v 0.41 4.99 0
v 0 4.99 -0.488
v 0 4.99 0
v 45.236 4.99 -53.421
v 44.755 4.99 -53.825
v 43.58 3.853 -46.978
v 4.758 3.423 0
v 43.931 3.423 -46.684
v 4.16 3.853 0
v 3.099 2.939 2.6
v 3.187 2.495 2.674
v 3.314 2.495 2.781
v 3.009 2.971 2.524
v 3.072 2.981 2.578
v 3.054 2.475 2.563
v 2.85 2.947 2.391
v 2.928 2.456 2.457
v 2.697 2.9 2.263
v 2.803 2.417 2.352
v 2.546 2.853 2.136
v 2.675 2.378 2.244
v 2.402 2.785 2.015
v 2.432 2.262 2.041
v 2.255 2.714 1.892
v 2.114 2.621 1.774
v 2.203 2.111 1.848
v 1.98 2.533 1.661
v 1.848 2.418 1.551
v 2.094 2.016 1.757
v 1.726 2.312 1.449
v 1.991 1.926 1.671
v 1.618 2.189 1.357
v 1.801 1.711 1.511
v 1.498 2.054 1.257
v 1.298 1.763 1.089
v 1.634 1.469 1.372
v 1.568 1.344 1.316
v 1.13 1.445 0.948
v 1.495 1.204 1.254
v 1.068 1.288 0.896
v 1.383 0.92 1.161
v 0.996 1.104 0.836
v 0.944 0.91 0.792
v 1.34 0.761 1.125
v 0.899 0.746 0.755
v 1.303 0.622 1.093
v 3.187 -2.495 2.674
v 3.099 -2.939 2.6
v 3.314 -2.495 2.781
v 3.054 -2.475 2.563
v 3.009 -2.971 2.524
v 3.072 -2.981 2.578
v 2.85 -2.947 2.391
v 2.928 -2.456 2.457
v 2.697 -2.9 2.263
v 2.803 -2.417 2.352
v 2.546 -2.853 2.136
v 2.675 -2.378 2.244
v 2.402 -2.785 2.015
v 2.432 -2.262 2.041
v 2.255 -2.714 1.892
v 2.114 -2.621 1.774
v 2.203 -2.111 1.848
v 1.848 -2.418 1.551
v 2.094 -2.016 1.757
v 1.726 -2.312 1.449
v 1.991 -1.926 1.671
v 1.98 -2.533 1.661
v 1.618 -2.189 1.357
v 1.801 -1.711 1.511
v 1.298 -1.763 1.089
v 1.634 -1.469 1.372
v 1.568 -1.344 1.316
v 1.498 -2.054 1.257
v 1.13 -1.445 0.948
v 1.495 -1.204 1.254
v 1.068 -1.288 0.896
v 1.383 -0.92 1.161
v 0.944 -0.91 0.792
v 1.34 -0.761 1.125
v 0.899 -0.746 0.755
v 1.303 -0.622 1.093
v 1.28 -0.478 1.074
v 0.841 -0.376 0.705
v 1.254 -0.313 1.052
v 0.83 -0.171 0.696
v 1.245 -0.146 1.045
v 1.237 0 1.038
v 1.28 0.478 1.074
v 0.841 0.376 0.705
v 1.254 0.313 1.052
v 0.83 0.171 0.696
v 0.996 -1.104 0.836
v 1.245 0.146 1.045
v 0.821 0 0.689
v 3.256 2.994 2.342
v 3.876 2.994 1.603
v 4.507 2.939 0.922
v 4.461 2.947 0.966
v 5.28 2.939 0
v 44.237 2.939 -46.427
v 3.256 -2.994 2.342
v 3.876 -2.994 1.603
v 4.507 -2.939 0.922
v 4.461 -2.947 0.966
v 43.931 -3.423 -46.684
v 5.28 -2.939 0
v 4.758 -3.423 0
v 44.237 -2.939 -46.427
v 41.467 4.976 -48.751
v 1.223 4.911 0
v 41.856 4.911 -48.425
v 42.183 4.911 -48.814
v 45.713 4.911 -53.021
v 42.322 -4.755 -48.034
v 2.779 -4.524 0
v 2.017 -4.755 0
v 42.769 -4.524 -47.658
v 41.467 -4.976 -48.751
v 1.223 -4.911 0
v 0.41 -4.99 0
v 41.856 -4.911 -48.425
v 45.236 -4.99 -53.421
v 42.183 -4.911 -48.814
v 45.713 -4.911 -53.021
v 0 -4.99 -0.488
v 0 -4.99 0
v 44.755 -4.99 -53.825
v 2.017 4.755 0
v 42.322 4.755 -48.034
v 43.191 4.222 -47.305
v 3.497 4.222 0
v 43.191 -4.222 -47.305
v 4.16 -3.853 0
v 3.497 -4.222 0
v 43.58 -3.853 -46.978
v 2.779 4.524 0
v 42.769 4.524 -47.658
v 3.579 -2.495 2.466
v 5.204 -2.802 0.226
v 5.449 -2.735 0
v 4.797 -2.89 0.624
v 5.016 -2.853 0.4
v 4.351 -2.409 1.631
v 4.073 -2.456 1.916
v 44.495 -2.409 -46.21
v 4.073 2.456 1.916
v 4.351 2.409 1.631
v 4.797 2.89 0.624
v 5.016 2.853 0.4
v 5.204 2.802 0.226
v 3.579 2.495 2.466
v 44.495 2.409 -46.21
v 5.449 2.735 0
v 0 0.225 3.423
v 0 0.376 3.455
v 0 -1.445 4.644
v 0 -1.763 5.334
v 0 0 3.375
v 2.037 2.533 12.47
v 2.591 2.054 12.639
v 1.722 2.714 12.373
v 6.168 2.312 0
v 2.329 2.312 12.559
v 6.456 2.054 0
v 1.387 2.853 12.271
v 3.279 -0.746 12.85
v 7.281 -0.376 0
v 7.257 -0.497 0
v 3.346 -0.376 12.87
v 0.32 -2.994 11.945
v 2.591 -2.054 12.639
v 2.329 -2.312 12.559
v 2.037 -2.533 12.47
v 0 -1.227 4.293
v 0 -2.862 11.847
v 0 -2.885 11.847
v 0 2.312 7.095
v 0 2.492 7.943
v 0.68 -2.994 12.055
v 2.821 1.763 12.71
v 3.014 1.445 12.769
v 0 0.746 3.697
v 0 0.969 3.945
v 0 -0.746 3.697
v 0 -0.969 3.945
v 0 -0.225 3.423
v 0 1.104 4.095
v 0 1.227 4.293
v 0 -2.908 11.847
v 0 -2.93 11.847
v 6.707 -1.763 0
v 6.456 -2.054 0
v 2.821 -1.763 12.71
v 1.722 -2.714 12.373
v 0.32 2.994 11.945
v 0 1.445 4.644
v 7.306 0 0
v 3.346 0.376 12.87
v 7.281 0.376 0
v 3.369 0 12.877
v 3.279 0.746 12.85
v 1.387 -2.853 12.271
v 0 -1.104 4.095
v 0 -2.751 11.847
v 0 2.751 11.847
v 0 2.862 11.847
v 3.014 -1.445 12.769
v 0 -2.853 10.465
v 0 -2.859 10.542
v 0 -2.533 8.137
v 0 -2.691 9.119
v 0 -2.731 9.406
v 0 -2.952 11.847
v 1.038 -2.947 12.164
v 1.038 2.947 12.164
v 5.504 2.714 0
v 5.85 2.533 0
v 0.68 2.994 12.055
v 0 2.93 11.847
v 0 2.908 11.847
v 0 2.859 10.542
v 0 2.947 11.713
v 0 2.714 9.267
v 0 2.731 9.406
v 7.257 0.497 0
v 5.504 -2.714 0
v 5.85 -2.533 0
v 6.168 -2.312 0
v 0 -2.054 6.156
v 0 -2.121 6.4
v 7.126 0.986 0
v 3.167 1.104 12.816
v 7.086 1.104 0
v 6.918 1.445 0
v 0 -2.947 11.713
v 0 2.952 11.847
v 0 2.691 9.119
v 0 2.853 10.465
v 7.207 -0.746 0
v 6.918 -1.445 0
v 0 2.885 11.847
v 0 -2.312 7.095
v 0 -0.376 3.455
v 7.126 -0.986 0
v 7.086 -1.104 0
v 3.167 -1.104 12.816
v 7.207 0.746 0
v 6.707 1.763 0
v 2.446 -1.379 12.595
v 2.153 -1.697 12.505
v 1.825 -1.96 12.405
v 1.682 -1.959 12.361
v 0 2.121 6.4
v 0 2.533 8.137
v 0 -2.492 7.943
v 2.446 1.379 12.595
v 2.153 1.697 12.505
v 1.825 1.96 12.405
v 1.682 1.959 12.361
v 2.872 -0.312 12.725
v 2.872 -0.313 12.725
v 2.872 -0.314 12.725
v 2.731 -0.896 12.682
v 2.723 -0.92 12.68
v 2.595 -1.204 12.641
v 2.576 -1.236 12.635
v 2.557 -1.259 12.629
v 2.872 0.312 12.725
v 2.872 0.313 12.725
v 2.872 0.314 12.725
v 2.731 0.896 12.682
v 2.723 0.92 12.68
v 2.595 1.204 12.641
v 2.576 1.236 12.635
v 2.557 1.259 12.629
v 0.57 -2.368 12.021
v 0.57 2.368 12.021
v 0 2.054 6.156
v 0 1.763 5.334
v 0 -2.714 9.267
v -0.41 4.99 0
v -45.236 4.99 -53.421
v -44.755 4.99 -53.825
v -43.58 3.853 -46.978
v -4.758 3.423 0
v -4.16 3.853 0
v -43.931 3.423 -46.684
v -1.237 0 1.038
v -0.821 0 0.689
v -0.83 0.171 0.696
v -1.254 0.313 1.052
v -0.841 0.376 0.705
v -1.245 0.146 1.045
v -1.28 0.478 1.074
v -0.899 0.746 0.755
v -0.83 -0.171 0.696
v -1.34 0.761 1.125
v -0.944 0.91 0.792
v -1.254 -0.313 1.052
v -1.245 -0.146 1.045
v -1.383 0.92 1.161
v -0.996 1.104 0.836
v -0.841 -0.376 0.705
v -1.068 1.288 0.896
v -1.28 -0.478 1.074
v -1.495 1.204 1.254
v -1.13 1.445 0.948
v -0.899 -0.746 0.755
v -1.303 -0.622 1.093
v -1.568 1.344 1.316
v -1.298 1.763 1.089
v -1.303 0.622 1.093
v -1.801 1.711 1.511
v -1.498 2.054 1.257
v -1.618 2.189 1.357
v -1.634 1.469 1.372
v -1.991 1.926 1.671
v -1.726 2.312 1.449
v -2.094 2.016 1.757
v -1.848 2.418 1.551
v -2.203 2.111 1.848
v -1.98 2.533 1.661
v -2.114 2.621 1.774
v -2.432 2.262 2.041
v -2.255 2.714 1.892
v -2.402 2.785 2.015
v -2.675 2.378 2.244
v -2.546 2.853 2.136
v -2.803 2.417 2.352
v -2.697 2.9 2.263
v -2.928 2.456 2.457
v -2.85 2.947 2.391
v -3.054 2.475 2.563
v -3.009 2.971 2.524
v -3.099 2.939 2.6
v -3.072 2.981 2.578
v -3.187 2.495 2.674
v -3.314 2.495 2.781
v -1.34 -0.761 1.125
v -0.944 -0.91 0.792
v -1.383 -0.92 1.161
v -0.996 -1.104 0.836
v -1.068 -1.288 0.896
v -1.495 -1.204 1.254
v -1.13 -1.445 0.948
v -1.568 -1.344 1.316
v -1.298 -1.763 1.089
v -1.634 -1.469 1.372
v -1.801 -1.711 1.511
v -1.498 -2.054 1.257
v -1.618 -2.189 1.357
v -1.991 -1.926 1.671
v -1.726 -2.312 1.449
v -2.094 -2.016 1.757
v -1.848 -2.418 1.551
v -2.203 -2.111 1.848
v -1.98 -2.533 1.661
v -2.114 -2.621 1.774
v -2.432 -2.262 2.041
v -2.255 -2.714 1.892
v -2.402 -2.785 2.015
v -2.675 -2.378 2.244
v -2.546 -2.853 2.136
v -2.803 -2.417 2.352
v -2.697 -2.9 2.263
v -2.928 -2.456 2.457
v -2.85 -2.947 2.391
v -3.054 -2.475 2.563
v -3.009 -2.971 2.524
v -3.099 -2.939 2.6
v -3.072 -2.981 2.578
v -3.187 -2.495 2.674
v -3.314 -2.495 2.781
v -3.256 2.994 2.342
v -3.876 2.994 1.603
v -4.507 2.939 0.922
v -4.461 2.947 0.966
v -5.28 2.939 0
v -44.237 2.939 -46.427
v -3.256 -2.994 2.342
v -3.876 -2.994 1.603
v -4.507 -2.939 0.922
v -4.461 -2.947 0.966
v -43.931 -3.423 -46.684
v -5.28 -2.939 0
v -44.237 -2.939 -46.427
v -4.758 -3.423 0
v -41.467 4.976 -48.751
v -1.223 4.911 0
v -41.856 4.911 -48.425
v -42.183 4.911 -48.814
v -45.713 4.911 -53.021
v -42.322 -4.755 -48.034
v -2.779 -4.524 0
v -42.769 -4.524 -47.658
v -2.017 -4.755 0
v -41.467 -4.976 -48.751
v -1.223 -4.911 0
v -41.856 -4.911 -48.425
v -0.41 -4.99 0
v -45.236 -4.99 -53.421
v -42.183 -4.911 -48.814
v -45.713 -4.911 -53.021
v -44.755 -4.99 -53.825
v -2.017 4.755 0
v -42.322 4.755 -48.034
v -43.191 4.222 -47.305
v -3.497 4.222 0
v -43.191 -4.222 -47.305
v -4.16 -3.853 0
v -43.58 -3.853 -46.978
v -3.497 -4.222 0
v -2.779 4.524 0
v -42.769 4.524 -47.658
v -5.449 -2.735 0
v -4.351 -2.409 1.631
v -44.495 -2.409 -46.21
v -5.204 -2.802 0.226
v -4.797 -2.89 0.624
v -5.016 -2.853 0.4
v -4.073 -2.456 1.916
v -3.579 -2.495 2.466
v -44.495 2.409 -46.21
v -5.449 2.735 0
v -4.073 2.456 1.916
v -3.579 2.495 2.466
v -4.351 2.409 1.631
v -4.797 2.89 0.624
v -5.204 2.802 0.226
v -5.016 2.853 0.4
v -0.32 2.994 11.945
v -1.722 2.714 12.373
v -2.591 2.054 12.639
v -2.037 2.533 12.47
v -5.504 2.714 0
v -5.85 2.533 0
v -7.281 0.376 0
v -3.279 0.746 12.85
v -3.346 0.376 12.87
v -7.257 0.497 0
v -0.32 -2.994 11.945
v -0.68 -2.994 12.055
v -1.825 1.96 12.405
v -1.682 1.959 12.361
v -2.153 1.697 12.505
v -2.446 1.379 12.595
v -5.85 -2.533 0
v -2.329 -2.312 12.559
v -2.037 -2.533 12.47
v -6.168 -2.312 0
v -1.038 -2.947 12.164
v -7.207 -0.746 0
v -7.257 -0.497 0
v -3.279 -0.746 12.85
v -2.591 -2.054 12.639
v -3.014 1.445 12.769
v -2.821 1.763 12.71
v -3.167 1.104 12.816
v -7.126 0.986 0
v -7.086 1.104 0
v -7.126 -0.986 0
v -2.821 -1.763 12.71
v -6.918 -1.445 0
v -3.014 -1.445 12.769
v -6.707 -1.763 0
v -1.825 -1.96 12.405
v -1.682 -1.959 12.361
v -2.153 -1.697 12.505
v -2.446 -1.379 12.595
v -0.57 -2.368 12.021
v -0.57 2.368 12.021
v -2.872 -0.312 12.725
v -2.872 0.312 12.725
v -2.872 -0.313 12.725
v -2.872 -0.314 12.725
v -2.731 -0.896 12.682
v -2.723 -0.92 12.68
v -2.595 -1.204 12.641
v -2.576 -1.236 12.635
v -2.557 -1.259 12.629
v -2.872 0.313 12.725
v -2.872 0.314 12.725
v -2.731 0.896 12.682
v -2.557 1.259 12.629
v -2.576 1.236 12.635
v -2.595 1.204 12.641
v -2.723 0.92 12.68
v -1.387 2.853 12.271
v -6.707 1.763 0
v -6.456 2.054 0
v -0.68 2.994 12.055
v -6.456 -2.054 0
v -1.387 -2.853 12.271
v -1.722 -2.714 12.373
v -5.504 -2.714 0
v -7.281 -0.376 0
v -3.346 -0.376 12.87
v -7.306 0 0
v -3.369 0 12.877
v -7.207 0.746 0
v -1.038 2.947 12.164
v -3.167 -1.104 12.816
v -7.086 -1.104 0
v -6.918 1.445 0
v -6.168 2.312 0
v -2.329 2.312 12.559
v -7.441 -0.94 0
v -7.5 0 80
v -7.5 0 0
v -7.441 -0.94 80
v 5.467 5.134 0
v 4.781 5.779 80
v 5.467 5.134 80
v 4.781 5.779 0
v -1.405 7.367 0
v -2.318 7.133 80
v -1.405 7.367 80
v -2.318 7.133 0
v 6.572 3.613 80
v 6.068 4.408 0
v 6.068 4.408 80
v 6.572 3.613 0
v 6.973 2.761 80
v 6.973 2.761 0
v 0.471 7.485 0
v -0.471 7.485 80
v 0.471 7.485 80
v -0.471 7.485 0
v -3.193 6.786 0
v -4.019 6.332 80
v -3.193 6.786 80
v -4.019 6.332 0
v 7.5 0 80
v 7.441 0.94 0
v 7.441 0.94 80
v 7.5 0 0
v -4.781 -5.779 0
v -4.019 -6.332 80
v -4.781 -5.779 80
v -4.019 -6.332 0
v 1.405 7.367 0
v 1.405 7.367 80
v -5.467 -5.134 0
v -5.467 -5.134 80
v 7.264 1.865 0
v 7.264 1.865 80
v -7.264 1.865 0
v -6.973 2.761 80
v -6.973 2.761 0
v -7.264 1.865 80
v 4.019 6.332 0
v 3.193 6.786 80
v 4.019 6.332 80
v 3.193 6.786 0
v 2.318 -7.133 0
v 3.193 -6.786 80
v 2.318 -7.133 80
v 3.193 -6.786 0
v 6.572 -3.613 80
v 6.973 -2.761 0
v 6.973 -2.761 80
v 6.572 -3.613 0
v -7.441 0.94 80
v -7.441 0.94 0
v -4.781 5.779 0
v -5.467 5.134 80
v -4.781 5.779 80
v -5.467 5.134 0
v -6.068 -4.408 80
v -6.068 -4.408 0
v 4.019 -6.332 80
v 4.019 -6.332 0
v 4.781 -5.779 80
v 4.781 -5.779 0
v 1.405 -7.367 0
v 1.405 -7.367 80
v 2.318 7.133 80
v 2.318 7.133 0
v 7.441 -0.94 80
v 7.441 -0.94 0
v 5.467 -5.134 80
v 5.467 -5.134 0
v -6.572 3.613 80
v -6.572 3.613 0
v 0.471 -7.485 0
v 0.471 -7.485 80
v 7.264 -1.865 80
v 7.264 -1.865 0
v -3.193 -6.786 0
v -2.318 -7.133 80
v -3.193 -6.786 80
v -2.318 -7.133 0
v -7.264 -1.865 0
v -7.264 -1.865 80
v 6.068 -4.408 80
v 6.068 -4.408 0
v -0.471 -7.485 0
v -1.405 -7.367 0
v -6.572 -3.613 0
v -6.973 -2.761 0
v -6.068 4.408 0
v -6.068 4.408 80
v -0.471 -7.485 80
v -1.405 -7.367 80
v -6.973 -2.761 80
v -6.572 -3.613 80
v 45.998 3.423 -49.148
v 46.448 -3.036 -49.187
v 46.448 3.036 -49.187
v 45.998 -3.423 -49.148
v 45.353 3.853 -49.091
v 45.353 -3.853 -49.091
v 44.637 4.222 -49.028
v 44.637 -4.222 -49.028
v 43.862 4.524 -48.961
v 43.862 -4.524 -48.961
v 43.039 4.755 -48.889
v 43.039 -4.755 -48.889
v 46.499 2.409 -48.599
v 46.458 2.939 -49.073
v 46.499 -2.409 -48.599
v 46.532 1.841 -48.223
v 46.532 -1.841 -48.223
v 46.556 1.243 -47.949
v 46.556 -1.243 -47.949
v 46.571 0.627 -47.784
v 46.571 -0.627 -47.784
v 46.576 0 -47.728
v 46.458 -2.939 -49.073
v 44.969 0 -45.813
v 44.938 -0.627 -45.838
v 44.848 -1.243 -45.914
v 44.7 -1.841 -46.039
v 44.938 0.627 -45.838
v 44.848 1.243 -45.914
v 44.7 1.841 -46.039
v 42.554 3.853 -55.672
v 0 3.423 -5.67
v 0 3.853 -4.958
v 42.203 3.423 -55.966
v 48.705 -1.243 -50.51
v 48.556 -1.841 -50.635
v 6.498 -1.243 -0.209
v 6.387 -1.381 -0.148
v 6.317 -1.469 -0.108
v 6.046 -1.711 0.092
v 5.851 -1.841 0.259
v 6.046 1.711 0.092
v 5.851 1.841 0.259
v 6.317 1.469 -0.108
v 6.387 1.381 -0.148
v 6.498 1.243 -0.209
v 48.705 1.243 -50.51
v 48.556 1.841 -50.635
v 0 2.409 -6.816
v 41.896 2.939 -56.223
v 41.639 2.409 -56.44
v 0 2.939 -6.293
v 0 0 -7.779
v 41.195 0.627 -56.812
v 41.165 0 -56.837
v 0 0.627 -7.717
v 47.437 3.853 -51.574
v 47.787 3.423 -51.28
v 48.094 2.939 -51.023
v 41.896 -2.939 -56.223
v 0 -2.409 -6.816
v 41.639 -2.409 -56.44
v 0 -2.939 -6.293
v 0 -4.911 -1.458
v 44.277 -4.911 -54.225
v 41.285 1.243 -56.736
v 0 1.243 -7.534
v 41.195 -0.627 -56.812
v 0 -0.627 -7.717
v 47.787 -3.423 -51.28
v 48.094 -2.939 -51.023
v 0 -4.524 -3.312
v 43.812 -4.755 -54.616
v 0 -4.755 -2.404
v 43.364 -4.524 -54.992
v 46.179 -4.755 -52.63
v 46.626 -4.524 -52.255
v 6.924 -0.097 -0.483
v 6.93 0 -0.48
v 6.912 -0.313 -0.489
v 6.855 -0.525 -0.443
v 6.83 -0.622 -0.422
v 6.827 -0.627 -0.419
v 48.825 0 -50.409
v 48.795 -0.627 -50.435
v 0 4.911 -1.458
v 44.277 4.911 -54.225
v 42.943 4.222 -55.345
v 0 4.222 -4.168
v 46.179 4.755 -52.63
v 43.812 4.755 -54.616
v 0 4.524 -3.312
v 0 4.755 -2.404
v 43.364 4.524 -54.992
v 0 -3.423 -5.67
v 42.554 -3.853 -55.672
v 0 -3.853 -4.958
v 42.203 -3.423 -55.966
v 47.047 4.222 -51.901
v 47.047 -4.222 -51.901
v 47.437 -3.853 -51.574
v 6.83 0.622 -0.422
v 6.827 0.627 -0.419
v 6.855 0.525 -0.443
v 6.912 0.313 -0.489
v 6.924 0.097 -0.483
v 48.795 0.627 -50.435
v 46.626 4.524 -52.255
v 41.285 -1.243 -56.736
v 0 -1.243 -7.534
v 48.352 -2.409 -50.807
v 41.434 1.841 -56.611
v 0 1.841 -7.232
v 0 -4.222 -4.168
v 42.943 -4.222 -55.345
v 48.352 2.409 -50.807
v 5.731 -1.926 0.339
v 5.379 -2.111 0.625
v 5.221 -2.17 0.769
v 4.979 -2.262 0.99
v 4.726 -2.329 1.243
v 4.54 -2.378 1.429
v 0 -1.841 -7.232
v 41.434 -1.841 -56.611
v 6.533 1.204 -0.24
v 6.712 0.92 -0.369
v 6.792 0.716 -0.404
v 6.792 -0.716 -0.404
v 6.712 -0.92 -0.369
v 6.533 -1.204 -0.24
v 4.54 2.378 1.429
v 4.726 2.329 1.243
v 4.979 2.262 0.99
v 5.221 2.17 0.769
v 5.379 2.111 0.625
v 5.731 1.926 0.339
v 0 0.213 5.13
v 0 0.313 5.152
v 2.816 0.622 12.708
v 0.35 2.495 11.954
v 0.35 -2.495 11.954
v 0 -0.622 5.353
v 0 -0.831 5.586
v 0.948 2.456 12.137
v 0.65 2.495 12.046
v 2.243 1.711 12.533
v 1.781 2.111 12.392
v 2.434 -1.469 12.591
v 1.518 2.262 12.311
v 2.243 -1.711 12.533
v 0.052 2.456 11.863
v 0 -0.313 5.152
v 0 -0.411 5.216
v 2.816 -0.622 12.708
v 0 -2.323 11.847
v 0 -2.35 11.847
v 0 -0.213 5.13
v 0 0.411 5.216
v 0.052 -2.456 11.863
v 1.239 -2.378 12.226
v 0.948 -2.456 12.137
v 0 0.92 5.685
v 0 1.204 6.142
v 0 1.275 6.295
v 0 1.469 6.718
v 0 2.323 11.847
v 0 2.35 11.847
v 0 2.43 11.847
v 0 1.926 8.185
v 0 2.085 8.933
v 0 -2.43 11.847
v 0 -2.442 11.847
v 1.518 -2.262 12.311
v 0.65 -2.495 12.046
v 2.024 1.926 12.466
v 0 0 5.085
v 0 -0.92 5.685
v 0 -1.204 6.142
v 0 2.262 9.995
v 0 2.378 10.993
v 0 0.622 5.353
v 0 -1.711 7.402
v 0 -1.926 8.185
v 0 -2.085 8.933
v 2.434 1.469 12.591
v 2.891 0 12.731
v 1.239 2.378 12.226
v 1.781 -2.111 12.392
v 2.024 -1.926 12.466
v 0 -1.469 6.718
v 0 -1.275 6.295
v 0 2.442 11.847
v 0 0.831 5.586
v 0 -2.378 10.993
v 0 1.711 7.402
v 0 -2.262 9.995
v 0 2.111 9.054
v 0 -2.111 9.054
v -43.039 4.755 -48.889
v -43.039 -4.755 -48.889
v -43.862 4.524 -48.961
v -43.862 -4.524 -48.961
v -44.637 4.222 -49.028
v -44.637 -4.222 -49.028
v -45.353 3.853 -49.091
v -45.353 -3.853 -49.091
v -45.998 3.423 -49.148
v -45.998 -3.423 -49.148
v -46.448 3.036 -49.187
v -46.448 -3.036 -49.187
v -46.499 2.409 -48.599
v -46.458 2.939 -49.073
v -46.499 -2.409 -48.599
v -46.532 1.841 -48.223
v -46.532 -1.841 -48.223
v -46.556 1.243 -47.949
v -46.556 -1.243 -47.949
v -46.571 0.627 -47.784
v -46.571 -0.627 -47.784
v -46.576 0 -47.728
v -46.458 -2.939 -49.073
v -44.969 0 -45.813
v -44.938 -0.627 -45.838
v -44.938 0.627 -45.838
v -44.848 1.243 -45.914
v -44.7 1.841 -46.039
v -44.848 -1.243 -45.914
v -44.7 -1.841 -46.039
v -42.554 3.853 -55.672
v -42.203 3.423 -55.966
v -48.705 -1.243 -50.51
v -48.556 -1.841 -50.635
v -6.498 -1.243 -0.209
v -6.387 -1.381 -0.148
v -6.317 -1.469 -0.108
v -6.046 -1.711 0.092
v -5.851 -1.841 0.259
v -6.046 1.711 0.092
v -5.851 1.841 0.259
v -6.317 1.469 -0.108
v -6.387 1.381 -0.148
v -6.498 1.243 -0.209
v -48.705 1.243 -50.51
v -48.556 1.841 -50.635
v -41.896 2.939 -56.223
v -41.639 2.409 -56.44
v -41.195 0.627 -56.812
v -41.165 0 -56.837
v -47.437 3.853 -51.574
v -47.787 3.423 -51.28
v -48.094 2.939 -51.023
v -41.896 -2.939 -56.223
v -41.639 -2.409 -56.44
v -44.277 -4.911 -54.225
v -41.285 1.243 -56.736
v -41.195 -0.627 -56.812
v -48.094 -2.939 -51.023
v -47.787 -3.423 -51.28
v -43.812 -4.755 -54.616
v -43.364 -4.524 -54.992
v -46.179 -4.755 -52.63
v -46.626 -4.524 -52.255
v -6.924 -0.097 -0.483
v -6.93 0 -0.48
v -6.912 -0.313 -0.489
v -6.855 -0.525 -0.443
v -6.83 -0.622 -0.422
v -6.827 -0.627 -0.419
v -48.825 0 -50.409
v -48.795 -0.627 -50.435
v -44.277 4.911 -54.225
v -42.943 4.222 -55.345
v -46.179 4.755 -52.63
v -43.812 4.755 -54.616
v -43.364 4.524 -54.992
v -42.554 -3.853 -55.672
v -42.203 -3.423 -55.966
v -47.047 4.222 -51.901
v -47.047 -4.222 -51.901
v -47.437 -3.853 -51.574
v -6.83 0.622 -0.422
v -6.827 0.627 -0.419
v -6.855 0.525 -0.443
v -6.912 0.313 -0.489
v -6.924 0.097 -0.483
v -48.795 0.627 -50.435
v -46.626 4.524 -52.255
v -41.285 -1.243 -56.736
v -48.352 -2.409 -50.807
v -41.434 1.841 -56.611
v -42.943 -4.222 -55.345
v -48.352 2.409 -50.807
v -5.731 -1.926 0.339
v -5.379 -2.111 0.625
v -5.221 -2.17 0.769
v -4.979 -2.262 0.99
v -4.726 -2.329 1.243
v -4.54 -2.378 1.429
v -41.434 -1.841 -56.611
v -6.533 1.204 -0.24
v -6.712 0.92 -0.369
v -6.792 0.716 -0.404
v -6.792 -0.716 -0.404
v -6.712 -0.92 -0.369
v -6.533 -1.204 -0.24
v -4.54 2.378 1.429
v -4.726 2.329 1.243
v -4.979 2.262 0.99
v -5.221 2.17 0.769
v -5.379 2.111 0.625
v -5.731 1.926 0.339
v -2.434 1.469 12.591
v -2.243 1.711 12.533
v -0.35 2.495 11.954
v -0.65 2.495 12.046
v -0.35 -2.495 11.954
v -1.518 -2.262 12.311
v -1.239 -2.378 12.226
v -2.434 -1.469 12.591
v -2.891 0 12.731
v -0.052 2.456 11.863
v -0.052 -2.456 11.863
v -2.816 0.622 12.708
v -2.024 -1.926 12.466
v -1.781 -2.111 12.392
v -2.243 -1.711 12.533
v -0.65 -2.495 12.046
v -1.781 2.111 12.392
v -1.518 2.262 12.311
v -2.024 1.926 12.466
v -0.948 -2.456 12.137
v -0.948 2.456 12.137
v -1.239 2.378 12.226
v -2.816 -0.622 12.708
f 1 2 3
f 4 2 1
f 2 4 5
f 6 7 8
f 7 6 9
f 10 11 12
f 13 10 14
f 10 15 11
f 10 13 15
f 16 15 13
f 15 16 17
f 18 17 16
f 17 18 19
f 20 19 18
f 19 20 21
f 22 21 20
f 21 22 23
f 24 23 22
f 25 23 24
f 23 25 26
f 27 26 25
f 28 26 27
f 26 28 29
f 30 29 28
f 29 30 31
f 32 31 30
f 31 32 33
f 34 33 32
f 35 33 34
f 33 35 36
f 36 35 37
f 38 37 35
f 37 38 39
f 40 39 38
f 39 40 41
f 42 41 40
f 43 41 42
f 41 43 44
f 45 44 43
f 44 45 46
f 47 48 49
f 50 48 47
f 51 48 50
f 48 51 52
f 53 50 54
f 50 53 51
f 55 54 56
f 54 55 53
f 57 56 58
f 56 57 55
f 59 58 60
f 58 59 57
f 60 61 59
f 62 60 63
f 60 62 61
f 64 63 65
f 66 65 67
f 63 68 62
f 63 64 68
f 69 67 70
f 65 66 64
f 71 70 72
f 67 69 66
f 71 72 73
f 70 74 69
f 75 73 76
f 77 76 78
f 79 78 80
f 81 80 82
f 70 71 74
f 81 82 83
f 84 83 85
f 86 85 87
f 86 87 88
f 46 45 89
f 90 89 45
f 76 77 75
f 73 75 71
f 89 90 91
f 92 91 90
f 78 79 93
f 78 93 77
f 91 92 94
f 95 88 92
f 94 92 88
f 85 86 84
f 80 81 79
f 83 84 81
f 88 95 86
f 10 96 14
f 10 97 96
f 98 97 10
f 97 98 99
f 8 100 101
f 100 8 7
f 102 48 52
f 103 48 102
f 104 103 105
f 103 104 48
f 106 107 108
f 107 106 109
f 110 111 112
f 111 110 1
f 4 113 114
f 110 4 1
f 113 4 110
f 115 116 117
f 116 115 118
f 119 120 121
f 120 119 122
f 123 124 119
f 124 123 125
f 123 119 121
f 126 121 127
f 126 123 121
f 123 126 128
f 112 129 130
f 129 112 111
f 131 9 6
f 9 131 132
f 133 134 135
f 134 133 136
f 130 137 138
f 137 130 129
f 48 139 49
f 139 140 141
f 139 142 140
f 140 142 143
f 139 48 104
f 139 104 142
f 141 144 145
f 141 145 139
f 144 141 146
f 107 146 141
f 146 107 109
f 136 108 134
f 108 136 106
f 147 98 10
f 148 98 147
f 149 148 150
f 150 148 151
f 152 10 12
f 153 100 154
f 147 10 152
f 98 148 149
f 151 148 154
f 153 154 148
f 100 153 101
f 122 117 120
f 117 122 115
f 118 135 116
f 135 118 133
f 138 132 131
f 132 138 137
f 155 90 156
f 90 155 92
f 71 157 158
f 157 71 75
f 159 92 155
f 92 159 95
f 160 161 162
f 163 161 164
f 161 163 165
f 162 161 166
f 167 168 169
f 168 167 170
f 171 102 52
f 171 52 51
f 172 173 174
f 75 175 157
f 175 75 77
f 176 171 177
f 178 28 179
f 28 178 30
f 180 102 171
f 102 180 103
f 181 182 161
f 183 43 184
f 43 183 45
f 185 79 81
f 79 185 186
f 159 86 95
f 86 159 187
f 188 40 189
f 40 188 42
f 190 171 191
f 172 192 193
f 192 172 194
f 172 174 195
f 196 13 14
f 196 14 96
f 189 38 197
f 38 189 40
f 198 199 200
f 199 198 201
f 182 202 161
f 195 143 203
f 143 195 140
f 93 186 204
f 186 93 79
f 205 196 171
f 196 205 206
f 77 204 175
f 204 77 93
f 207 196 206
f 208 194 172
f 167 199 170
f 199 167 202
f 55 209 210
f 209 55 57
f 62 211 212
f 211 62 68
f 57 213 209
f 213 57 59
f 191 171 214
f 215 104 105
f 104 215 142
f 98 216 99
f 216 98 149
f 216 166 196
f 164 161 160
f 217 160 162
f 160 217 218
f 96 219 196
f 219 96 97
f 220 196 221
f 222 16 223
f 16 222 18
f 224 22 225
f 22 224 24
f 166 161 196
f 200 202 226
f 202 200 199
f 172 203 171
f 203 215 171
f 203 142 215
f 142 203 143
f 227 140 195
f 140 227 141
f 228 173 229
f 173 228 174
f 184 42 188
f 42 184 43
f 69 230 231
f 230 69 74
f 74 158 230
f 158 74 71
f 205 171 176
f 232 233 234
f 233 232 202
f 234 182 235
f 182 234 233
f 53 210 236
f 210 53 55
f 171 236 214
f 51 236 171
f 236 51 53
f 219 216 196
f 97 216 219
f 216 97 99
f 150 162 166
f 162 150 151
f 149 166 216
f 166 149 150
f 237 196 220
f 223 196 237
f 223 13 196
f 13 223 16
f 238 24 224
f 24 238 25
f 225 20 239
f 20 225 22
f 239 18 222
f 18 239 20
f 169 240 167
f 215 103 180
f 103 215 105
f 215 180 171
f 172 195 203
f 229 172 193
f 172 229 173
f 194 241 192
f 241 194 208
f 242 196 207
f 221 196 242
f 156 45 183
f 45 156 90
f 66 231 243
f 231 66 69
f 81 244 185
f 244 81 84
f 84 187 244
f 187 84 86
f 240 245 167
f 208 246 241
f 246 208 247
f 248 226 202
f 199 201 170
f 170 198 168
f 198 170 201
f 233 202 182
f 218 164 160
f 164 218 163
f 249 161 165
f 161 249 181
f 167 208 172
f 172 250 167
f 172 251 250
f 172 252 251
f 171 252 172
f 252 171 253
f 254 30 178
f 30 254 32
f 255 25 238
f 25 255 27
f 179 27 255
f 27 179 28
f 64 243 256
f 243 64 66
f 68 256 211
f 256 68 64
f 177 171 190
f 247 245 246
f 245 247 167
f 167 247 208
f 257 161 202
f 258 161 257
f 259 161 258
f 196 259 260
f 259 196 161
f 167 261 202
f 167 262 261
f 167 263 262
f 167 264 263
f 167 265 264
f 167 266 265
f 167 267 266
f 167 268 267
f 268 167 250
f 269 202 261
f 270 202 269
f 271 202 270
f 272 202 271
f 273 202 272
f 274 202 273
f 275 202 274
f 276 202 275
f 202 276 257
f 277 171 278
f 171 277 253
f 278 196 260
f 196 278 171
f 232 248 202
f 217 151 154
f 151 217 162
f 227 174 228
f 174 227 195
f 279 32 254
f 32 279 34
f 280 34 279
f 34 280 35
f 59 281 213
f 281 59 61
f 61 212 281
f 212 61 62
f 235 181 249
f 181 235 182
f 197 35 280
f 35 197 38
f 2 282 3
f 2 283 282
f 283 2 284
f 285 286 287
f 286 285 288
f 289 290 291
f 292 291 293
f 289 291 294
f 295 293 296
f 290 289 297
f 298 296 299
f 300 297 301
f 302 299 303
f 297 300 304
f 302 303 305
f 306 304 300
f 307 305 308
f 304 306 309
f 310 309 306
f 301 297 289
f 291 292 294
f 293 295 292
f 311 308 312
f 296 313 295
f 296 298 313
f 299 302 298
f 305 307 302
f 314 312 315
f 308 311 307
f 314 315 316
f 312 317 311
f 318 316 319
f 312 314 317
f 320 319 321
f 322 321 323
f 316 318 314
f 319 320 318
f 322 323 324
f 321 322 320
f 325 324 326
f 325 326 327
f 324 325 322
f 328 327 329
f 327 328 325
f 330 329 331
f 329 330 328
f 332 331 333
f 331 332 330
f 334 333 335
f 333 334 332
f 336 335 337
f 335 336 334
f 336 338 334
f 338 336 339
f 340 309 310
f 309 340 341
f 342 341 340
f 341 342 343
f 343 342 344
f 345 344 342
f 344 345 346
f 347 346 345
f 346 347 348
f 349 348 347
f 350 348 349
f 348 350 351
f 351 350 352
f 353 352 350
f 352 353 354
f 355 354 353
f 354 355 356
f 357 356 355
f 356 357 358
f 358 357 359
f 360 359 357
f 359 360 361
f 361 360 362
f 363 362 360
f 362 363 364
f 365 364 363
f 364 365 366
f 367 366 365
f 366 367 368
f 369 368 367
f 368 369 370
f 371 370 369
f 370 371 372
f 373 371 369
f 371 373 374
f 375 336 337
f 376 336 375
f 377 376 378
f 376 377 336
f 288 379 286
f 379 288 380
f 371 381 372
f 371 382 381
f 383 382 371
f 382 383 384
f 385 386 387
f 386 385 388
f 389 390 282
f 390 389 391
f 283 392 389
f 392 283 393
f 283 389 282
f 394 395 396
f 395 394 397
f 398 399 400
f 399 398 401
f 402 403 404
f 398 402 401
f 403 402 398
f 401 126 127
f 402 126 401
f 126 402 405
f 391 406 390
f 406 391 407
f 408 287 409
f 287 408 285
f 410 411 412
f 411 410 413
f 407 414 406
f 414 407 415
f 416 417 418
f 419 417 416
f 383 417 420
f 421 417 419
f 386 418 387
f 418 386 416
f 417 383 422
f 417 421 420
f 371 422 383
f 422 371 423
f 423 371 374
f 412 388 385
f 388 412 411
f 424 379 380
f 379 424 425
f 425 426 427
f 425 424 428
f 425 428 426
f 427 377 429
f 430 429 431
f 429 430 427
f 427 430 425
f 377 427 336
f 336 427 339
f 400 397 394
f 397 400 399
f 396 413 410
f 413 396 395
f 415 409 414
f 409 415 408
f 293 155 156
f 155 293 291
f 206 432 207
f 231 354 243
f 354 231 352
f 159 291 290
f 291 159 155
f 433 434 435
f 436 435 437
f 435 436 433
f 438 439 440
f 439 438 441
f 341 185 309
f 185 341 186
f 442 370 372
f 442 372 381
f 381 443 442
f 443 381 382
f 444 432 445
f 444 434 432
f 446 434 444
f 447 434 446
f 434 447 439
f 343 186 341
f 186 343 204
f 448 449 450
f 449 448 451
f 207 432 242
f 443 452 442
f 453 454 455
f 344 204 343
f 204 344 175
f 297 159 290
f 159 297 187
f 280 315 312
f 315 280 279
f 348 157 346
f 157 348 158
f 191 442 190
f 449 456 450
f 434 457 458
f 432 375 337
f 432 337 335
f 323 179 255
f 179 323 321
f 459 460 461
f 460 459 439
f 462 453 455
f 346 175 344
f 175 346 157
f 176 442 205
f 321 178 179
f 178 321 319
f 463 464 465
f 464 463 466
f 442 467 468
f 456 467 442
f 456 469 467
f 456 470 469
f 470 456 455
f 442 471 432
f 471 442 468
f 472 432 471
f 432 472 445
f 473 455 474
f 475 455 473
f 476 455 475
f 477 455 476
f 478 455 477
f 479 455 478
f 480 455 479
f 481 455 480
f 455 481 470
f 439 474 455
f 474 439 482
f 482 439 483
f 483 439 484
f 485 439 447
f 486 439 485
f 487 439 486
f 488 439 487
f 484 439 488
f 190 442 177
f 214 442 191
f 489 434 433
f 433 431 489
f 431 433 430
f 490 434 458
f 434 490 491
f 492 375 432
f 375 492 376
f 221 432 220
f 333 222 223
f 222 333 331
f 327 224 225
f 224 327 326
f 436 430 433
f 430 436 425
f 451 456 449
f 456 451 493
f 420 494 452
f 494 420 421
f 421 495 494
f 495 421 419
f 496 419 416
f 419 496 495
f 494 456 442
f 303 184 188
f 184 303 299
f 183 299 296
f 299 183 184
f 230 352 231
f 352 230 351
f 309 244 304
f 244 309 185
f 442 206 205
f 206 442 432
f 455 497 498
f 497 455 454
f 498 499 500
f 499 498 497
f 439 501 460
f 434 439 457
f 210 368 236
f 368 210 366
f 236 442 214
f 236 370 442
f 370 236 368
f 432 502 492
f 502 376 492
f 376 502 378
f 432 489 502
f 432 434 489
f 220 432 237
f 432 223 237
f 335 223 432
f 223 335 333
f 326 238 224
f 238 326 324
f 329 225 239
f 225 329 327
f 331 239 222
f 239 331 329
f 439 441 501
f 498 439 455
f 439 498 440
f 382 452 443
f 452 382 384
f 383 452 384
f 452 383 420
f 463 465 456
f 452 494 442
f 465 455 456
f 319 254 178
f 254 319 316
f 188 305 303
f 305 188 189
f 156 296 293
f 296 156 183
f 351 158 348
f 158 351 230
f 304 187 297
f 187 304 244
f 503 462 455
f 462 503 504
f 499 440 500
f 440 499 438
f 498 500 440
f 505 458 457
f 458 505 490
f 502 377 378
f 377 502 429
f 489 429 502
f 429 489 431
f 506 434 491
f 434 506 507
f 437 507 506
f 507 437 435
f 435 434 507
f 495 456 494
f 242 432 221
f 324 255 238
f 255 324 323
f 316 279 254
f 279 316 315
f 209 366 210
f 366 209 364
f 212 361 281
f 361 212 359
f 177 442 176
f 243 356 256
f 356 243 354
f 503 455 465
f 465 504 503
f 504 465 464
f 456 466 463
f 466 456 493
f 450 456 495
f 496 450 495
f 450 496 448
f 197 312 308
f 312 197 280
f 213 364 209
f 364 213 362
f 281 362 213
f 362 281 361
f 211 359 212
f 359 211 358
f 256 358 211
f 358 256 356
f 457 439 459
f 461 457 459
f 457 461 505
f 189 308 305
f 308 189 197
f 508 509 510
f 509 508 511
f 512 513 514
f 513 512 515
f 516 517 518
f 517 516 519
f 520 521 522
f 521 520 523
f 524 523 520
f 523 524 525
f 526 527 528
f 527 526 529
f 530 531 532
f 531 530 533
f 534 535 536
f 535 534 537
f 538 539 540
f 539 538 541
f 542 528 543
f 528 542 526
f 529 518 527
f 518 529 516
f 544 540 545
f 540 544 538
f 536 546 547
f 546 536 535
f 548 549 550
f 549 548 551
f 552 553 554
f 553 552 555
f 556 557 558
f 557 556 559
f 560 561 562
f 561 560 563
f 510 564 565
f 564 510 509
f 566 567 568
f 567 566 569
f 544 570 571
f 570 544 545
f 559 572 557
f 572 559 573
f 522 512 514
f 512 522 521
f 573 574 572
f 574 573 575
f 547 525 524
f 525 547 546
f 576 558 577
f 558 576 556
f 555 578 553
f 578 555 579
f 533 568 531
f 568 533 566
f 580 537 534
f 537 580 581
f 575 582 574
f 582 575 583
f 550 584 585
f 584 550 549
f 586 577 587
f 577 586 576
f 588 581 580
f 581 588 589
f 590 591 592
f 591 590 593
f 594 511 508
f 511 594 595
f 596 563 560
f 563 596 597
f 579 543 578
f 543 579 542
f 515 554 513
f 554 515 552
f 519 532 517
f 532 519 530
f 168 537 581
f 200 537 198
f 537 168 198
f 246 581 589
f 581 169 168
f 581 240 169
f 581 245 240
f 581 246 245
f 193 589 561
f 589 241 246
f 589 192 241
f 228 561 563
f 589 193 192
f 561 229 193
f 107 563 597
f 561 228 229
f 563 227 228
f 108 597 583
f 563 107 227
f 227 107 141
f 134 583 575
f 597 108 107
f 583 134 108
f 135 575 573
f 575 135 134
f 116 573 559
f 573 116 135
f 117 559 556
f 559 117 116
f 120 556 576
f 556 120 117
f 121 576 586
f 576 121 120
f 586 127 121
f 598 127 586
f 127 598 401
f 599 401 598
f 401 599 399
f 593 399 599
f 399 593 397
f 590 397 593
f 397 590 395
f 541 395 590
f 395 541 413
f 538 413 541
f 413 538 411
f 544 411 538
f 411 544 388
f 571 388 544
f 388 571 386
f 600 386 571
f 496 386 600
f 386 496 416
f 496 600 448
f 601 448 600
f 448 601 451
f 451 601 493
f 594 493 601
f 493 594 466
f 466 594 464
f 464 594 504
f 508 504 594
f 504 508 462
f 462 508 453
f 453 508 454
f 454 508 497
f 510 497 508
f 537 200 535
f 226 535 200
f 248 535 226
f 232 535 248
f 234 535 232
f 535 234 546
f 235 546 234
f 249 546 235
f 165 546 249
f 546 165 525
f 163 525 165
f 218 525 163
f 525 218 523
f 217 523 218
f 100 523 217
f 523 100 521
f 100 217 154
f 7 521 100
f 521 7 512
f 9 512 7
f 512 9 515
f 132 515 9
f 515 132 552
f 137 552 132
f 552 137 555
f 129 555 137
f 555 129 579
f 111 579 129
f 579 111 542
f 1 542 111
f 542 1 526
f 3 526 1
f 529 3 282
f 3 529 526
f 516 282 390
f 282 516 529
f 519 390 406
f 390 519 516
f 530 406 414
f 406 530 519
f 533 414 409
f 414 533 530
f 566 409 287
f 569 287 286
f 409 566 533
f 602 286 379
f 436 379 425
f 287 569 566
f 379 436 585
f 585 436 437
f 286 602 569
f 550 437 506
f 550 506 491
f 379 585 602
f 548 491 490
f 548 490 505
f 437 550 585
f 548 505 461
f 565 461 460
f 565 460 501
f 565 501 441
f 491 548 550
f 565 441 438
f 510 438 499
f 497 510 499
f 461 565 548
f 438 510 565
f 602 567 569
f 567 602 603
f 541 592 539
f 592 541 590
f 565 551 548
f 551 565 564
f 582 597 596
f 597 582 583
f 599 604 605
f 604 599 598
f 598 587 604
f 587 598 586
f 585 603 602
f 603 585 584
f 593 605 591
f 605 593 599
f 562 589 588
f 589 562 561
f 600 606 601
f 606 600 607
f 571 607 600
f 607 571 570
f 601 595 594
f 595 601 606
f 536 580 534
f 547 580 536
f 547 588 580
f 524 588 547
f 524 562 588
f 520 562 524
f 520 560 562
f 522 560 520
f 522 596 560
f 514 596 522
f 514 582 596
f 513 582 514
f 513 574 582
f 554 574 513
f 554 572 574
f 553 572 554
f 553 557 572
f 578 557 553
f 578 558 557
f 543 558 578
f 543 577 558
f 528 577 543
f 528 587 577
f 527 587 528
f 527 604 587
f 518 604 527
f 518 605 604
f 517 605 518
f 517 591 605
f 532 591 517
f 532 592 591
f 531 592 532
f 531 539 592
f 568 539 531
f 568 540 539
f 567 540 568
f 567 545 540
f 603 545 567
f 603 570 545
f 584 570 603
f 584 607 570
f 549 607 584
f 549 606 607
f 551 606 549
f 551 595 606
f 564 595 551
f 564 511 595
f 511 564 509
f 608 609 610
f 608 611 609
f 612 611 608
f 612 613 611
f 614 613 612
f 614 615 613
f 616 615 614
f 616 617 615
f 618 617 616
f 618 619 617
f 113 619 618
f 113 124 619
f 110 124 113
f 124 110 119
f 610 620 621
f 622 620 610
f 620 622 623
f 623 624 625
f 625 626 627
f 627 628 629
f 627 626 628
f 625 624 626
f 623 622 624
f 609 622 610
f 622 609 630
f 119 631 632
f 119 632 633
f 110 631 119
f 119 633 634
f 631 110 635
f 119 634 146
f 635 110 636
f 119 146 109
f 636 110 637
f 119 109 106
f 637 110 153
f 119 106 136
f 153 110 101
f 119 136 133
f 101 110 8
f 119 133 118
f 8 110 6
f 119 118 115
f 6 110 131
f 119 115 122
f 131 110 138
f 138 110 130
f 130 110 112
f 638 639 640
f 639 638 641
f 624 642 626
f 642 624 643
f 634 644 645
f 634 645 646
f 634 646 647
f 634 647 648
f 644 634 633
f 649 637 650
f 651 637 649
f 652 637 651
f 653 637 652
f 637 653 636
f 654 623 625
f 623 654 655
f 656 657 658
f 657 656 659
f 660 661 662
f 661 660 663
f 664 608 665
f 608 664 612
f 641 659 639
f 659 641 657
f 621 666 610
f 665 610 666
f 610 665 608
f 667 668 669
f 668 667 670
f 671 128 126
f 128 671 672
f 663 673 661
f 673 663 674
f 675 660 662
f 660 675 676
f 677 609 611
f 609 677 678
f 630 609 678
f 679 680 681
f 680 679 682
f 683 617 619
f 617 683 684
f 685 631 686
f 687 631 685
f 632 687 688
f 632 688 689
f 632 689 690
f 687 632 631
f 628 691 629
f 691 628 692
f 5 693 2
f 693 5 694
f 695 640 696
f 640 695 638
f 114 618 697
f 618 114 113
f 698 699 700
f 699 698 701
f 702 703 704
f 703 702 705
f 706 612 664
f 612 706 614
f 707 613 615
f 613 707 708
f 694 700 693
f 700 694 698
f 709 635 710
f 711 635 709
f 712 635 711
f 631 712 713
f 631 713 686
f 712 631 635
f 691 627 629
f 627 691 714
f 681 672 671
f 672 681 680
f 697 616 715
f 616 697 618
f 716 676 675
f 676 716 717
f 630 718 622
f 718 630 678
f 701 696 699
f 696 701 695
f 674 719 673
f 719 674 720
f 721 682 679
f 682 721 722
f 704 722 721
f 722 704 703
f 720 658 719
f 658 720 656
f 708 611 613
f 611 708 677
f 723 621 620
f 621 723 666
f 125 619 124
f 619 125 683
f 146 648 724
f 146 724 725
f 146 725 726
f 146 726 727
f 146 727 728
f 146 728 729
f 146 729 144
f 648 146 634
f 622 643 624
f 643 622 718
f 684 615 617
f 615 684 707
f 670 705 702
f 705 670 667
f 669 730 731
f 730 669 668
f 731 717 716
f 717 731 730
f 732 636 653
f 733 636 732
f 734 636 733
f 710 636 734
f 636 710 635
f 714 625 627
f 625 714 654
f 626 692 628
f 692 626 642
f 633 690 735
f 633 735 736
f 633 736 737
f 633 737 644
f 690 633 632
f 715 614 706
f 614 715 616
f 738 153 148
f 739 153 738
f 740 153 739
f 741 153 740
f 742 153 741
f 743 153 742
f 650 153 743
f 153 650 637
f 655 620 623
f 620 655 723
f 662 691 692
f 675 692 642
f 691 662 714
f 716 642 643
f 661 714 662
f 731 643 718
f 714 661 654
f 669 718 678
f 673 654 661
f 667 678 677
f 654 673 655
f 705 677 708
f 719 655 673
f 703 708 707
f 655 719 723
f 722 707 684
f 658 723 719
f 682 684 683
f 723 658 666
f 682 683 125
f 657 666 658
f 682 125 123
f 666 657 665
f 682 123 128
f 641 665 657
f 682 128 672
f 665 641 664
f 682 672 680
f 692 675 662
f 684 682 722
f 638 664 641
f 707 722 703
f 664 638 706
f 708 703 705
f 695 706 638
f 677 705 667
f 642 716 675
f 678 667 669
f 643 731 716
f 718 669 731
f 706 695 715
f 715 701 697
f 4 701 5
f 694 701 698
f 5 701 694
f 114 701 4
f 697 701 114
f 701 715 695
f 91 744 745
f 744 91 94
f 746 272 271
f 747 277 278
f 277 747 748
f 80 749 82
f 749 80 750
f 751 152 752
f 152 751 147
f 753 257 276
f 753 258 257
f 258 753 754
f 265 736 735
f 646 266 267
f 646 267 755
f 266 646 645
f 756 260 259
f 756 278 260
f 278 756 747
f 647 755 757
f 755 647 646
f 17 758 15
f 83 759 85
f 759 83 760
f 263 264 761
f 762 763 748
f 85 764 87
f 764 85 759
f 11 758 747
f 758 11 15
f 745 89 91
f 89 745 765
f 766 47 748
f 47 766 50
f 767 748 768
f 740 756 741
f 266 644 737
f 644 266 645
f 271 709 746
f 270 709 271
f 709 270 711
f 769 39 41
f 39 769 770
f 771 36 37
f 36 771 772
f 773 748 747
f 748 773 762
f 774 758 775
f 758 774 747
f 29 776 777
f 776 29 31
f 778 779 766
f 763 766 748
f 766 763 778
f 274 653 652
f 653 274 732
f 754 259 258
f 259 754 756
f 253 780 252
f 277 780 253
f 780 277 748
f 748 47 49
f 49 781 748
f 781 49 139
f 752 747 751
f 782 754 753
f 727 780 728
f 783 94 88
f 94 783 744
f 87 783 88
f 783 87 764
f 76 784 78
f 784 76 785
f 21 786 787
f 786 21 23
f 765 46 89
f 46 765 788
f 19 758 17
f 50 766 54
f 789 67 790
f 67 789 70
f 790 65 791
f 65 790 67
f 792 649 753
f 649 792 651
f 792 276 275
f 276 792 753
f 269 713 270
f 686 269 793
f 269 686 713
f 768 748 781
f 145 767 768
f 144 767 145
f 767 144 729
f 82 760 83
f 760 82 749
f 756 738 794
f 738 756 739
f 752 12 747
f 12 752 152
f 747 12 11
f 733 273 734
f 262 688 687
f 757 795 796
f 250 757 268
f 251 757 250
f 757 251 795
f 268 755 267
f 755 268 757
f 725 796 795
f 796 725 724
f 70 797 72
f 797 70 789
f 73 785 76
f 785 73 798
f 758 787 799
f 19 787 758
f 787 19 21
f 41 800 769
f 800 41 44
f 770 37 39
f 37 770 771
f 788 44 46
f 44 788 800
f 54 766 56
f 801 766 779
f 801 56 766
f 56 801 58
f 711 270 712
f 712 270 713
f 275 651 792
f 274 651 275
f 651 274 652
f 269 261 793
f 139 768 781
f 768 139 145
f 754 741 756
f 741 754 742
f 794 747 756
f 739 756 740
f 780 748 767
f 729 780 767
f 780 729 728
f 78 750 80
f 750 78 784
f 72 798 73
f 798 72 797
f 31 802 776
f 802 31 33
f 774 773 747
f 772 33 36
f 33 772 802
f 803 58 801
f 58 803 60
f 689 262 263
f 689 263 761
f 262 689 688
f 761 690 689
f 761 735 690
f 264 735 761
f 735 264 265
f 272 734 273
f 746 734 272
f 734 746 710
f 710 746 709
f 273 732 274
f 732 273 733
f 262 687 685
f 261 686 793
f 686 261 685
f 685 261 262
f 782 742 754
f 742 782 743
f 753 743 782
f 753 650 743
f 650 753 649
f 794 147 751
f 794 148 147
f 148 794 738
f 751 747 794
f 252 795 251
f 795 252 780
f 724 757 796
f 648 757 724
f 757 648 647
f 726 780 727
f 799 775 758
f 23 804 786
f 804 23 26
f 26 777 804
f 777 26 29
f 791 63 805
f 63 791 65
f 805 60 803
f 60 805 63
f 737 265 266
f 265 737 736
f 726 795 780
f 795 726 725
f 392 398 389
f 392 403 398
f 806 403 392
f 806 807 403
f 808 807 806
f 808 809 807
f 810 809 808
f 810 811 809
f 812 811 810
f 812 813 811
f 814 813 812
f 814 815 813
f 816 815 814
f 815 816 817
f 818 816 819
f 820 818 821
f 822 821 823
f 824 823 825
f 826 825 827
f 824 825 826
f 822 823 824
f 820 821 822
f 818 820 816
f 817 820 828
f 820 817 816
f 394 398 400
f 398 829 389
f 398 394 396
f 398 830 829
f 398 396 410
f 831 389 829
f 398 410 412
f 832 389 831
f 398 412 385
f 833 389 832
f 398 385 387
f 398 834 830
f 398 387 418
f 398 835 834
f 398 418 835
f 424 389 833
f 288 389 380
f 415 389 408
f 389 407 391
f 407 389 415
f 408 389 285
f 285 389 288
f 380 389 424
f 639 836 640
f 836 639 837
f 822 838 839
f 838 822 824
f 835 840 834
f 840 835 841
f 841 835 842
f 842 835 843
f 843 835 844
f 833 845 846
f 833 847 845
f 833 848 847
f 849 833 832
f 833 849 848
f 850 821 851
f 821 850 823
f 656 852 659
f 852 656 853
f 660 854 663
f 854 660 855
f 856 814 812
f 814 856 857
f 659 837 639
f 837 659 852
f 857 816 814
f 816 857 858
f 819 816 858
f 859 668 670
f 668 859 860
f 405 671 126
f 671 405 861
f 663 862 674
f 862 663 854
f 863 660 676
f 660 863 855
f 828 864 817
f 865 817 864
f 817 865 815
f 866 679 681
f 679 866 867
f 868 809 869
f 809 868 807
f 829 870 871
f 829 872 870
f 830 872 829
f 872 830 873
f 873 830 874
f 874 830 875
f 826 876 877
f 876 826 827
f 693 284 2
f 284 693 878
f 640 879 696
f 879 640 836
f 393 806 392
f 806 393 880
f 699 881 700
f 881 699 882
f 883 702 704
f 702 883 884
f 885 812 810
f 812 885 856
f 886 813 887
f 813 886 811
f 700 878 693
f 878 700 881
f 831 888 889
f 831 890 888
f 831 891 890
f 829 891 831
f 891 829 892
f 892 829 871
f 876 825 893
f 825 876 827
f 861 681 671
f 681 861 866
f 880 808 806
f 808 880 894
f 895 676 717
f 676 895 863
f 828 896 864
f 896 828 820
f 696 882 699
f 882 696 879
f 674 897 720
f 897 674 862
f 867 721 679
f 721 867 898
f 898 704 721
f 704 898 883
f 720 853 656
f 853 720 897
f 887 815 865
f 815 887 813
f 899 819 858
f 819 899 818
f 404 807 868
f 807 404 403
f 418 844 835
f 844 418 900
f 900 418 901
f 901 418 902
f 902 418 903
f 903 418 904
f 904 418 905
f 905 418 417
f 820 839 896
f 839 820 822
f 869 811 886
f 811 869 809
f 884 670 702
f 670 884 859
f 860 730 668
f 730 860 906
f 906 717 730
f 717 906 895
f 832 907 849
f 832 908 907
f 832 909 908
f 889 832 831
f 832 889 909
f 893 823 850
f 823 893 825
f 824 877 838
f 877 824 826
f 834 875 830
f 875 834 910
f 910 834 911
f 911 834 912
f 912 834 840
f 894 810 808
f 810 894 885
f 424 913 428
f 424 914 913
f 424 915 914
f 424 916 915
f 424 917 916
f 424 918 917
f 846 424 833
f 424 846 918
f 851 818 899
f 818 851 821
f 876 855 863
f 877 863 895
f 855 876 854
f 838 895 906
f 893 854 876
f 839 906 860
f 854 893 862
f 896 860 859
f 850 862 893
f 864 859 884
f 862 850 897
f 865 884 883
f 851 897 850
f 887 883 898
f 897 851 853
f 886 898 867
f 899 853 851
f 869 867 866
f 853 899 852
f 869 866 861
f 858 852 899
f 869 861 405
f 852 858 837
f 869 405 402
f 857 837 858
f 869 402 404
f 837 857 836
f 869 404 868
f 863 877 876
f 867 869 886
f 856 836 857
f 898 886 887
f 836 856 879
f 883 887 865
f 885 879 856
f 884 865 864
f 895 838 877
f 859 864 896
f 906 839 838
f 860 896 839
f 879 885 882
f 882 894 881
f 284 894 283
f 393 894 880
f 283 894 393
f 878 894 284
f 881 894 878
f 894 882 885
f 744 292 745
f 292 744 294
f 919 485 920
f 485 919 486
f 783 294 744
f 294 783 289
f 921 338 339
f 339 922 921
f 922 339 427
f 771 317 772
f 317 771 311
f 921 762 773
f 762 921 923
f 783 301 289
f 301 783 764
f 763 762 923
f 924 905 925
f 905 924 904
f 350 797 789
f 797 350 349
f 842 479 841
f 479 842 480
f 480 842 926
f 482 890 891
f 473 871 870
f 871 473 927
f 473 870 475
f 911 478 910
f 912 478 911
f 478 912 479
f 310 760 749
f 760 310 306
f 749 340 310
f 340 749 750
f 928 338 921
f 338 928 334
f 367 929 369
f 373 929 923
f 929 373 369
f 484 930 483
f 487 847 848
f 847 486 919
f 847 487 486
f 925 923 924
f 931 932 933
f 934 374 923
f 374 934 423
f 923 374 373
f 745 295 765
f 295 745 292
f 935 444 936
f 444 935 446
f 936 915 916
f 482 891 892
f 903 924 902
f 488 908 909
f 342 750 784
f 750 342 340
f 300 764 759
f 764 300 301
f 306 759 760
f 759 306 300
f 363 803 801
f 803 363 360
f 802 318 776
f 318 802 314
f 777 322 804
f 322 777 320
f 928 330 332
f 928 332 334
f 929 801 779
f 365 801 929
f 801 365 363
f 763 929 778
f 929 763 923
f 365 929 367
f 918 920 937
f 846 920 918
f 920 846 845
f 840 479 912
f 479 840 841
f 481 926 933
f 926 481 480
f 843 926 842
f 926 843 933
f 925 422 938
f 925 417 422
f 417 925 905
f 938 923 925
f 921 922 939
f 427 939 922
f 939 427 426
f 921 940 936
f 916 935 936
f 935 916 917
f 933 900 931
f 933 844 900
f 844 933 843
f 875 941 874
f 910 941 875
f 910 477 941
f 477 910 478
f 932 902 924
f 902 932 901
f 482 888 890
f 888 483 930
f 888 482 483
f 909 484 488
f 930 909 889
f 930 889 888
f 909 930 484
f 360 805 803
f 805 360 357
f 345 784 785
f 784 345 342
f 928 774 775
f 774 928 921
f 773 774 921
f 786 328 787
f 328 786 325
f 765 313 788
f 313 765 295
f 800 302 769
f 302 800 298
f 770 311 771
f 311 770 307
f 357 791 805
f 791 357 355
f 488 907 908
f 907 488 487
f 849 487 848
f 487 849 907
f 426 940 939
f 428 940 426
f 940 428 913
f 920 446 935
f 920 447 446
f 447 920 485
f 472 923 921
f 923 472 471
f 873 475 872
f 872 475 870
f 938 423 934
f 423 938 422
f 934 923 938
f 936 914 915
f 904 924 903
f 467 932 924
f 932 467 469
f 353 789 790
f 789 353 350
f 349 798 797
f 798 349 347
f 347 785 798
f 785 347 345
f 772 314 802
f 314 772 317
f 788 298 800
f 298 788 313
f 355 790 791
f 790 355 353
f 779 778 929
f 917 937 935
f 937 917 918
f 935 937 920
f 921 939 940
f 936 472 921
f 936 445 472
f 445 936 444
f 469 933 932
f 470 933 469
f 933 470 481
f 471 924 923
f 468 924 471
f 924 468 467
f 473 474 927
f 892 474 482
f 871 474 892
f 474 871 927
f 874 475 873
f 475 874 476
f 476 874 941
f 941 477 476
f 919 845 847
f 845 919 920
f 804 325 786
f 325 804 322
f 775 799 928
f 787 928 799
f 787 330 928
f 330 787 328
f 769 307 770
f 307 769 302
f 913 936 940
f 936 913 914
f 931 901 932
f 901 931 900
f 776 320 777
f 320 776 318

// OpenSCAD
$fn = 50;

module shaft() {
  cylinder (r=7.5, h=80);
}

module arms(side, connector_rad) {
   arm_rad = 5;
   arm_len = 70;
   mirror(v=[side,0,0]) {
   // arm 1
    rotate (a=140,v=[0,1,0]) {
      difference() {
        cylinder (r=arm_rad, h=arm_len);
        translate([-arm_rad*1.5,-arm_rad,arm_len-6])
          difference() {
           rotate(a=45, v=[0,1,0])
            cube([arm_rad,arm_rad*2,arm_rad]);
           translate([0,0,-arm_rad])
             cube([arm_rad*2,arm_rad*2,arm_rad]);
          }
      }
    }
    translate([0.5,0,12])
      rotate(a=163,v=[0,1,0])
        cylinder (r=connector_rad, h=20);
   }
 }

module print_shaft() {
  difference () {
    shaft();
    arms(0, 3);
    arms(1, 3);
  }
}

module print_arm0() {
  difference() {
     arms(0, 2.5);
     translate([-30,-5,-10])
       cube([30,30,30]);
  }
}

module print_arm1() {
  difference() {
     arms(1, 2.5);
     translate([0,-5,-10])
       cube([30,30,30]);
  }
}

print_shaft();
print_arm0();
print_arm1();

    
